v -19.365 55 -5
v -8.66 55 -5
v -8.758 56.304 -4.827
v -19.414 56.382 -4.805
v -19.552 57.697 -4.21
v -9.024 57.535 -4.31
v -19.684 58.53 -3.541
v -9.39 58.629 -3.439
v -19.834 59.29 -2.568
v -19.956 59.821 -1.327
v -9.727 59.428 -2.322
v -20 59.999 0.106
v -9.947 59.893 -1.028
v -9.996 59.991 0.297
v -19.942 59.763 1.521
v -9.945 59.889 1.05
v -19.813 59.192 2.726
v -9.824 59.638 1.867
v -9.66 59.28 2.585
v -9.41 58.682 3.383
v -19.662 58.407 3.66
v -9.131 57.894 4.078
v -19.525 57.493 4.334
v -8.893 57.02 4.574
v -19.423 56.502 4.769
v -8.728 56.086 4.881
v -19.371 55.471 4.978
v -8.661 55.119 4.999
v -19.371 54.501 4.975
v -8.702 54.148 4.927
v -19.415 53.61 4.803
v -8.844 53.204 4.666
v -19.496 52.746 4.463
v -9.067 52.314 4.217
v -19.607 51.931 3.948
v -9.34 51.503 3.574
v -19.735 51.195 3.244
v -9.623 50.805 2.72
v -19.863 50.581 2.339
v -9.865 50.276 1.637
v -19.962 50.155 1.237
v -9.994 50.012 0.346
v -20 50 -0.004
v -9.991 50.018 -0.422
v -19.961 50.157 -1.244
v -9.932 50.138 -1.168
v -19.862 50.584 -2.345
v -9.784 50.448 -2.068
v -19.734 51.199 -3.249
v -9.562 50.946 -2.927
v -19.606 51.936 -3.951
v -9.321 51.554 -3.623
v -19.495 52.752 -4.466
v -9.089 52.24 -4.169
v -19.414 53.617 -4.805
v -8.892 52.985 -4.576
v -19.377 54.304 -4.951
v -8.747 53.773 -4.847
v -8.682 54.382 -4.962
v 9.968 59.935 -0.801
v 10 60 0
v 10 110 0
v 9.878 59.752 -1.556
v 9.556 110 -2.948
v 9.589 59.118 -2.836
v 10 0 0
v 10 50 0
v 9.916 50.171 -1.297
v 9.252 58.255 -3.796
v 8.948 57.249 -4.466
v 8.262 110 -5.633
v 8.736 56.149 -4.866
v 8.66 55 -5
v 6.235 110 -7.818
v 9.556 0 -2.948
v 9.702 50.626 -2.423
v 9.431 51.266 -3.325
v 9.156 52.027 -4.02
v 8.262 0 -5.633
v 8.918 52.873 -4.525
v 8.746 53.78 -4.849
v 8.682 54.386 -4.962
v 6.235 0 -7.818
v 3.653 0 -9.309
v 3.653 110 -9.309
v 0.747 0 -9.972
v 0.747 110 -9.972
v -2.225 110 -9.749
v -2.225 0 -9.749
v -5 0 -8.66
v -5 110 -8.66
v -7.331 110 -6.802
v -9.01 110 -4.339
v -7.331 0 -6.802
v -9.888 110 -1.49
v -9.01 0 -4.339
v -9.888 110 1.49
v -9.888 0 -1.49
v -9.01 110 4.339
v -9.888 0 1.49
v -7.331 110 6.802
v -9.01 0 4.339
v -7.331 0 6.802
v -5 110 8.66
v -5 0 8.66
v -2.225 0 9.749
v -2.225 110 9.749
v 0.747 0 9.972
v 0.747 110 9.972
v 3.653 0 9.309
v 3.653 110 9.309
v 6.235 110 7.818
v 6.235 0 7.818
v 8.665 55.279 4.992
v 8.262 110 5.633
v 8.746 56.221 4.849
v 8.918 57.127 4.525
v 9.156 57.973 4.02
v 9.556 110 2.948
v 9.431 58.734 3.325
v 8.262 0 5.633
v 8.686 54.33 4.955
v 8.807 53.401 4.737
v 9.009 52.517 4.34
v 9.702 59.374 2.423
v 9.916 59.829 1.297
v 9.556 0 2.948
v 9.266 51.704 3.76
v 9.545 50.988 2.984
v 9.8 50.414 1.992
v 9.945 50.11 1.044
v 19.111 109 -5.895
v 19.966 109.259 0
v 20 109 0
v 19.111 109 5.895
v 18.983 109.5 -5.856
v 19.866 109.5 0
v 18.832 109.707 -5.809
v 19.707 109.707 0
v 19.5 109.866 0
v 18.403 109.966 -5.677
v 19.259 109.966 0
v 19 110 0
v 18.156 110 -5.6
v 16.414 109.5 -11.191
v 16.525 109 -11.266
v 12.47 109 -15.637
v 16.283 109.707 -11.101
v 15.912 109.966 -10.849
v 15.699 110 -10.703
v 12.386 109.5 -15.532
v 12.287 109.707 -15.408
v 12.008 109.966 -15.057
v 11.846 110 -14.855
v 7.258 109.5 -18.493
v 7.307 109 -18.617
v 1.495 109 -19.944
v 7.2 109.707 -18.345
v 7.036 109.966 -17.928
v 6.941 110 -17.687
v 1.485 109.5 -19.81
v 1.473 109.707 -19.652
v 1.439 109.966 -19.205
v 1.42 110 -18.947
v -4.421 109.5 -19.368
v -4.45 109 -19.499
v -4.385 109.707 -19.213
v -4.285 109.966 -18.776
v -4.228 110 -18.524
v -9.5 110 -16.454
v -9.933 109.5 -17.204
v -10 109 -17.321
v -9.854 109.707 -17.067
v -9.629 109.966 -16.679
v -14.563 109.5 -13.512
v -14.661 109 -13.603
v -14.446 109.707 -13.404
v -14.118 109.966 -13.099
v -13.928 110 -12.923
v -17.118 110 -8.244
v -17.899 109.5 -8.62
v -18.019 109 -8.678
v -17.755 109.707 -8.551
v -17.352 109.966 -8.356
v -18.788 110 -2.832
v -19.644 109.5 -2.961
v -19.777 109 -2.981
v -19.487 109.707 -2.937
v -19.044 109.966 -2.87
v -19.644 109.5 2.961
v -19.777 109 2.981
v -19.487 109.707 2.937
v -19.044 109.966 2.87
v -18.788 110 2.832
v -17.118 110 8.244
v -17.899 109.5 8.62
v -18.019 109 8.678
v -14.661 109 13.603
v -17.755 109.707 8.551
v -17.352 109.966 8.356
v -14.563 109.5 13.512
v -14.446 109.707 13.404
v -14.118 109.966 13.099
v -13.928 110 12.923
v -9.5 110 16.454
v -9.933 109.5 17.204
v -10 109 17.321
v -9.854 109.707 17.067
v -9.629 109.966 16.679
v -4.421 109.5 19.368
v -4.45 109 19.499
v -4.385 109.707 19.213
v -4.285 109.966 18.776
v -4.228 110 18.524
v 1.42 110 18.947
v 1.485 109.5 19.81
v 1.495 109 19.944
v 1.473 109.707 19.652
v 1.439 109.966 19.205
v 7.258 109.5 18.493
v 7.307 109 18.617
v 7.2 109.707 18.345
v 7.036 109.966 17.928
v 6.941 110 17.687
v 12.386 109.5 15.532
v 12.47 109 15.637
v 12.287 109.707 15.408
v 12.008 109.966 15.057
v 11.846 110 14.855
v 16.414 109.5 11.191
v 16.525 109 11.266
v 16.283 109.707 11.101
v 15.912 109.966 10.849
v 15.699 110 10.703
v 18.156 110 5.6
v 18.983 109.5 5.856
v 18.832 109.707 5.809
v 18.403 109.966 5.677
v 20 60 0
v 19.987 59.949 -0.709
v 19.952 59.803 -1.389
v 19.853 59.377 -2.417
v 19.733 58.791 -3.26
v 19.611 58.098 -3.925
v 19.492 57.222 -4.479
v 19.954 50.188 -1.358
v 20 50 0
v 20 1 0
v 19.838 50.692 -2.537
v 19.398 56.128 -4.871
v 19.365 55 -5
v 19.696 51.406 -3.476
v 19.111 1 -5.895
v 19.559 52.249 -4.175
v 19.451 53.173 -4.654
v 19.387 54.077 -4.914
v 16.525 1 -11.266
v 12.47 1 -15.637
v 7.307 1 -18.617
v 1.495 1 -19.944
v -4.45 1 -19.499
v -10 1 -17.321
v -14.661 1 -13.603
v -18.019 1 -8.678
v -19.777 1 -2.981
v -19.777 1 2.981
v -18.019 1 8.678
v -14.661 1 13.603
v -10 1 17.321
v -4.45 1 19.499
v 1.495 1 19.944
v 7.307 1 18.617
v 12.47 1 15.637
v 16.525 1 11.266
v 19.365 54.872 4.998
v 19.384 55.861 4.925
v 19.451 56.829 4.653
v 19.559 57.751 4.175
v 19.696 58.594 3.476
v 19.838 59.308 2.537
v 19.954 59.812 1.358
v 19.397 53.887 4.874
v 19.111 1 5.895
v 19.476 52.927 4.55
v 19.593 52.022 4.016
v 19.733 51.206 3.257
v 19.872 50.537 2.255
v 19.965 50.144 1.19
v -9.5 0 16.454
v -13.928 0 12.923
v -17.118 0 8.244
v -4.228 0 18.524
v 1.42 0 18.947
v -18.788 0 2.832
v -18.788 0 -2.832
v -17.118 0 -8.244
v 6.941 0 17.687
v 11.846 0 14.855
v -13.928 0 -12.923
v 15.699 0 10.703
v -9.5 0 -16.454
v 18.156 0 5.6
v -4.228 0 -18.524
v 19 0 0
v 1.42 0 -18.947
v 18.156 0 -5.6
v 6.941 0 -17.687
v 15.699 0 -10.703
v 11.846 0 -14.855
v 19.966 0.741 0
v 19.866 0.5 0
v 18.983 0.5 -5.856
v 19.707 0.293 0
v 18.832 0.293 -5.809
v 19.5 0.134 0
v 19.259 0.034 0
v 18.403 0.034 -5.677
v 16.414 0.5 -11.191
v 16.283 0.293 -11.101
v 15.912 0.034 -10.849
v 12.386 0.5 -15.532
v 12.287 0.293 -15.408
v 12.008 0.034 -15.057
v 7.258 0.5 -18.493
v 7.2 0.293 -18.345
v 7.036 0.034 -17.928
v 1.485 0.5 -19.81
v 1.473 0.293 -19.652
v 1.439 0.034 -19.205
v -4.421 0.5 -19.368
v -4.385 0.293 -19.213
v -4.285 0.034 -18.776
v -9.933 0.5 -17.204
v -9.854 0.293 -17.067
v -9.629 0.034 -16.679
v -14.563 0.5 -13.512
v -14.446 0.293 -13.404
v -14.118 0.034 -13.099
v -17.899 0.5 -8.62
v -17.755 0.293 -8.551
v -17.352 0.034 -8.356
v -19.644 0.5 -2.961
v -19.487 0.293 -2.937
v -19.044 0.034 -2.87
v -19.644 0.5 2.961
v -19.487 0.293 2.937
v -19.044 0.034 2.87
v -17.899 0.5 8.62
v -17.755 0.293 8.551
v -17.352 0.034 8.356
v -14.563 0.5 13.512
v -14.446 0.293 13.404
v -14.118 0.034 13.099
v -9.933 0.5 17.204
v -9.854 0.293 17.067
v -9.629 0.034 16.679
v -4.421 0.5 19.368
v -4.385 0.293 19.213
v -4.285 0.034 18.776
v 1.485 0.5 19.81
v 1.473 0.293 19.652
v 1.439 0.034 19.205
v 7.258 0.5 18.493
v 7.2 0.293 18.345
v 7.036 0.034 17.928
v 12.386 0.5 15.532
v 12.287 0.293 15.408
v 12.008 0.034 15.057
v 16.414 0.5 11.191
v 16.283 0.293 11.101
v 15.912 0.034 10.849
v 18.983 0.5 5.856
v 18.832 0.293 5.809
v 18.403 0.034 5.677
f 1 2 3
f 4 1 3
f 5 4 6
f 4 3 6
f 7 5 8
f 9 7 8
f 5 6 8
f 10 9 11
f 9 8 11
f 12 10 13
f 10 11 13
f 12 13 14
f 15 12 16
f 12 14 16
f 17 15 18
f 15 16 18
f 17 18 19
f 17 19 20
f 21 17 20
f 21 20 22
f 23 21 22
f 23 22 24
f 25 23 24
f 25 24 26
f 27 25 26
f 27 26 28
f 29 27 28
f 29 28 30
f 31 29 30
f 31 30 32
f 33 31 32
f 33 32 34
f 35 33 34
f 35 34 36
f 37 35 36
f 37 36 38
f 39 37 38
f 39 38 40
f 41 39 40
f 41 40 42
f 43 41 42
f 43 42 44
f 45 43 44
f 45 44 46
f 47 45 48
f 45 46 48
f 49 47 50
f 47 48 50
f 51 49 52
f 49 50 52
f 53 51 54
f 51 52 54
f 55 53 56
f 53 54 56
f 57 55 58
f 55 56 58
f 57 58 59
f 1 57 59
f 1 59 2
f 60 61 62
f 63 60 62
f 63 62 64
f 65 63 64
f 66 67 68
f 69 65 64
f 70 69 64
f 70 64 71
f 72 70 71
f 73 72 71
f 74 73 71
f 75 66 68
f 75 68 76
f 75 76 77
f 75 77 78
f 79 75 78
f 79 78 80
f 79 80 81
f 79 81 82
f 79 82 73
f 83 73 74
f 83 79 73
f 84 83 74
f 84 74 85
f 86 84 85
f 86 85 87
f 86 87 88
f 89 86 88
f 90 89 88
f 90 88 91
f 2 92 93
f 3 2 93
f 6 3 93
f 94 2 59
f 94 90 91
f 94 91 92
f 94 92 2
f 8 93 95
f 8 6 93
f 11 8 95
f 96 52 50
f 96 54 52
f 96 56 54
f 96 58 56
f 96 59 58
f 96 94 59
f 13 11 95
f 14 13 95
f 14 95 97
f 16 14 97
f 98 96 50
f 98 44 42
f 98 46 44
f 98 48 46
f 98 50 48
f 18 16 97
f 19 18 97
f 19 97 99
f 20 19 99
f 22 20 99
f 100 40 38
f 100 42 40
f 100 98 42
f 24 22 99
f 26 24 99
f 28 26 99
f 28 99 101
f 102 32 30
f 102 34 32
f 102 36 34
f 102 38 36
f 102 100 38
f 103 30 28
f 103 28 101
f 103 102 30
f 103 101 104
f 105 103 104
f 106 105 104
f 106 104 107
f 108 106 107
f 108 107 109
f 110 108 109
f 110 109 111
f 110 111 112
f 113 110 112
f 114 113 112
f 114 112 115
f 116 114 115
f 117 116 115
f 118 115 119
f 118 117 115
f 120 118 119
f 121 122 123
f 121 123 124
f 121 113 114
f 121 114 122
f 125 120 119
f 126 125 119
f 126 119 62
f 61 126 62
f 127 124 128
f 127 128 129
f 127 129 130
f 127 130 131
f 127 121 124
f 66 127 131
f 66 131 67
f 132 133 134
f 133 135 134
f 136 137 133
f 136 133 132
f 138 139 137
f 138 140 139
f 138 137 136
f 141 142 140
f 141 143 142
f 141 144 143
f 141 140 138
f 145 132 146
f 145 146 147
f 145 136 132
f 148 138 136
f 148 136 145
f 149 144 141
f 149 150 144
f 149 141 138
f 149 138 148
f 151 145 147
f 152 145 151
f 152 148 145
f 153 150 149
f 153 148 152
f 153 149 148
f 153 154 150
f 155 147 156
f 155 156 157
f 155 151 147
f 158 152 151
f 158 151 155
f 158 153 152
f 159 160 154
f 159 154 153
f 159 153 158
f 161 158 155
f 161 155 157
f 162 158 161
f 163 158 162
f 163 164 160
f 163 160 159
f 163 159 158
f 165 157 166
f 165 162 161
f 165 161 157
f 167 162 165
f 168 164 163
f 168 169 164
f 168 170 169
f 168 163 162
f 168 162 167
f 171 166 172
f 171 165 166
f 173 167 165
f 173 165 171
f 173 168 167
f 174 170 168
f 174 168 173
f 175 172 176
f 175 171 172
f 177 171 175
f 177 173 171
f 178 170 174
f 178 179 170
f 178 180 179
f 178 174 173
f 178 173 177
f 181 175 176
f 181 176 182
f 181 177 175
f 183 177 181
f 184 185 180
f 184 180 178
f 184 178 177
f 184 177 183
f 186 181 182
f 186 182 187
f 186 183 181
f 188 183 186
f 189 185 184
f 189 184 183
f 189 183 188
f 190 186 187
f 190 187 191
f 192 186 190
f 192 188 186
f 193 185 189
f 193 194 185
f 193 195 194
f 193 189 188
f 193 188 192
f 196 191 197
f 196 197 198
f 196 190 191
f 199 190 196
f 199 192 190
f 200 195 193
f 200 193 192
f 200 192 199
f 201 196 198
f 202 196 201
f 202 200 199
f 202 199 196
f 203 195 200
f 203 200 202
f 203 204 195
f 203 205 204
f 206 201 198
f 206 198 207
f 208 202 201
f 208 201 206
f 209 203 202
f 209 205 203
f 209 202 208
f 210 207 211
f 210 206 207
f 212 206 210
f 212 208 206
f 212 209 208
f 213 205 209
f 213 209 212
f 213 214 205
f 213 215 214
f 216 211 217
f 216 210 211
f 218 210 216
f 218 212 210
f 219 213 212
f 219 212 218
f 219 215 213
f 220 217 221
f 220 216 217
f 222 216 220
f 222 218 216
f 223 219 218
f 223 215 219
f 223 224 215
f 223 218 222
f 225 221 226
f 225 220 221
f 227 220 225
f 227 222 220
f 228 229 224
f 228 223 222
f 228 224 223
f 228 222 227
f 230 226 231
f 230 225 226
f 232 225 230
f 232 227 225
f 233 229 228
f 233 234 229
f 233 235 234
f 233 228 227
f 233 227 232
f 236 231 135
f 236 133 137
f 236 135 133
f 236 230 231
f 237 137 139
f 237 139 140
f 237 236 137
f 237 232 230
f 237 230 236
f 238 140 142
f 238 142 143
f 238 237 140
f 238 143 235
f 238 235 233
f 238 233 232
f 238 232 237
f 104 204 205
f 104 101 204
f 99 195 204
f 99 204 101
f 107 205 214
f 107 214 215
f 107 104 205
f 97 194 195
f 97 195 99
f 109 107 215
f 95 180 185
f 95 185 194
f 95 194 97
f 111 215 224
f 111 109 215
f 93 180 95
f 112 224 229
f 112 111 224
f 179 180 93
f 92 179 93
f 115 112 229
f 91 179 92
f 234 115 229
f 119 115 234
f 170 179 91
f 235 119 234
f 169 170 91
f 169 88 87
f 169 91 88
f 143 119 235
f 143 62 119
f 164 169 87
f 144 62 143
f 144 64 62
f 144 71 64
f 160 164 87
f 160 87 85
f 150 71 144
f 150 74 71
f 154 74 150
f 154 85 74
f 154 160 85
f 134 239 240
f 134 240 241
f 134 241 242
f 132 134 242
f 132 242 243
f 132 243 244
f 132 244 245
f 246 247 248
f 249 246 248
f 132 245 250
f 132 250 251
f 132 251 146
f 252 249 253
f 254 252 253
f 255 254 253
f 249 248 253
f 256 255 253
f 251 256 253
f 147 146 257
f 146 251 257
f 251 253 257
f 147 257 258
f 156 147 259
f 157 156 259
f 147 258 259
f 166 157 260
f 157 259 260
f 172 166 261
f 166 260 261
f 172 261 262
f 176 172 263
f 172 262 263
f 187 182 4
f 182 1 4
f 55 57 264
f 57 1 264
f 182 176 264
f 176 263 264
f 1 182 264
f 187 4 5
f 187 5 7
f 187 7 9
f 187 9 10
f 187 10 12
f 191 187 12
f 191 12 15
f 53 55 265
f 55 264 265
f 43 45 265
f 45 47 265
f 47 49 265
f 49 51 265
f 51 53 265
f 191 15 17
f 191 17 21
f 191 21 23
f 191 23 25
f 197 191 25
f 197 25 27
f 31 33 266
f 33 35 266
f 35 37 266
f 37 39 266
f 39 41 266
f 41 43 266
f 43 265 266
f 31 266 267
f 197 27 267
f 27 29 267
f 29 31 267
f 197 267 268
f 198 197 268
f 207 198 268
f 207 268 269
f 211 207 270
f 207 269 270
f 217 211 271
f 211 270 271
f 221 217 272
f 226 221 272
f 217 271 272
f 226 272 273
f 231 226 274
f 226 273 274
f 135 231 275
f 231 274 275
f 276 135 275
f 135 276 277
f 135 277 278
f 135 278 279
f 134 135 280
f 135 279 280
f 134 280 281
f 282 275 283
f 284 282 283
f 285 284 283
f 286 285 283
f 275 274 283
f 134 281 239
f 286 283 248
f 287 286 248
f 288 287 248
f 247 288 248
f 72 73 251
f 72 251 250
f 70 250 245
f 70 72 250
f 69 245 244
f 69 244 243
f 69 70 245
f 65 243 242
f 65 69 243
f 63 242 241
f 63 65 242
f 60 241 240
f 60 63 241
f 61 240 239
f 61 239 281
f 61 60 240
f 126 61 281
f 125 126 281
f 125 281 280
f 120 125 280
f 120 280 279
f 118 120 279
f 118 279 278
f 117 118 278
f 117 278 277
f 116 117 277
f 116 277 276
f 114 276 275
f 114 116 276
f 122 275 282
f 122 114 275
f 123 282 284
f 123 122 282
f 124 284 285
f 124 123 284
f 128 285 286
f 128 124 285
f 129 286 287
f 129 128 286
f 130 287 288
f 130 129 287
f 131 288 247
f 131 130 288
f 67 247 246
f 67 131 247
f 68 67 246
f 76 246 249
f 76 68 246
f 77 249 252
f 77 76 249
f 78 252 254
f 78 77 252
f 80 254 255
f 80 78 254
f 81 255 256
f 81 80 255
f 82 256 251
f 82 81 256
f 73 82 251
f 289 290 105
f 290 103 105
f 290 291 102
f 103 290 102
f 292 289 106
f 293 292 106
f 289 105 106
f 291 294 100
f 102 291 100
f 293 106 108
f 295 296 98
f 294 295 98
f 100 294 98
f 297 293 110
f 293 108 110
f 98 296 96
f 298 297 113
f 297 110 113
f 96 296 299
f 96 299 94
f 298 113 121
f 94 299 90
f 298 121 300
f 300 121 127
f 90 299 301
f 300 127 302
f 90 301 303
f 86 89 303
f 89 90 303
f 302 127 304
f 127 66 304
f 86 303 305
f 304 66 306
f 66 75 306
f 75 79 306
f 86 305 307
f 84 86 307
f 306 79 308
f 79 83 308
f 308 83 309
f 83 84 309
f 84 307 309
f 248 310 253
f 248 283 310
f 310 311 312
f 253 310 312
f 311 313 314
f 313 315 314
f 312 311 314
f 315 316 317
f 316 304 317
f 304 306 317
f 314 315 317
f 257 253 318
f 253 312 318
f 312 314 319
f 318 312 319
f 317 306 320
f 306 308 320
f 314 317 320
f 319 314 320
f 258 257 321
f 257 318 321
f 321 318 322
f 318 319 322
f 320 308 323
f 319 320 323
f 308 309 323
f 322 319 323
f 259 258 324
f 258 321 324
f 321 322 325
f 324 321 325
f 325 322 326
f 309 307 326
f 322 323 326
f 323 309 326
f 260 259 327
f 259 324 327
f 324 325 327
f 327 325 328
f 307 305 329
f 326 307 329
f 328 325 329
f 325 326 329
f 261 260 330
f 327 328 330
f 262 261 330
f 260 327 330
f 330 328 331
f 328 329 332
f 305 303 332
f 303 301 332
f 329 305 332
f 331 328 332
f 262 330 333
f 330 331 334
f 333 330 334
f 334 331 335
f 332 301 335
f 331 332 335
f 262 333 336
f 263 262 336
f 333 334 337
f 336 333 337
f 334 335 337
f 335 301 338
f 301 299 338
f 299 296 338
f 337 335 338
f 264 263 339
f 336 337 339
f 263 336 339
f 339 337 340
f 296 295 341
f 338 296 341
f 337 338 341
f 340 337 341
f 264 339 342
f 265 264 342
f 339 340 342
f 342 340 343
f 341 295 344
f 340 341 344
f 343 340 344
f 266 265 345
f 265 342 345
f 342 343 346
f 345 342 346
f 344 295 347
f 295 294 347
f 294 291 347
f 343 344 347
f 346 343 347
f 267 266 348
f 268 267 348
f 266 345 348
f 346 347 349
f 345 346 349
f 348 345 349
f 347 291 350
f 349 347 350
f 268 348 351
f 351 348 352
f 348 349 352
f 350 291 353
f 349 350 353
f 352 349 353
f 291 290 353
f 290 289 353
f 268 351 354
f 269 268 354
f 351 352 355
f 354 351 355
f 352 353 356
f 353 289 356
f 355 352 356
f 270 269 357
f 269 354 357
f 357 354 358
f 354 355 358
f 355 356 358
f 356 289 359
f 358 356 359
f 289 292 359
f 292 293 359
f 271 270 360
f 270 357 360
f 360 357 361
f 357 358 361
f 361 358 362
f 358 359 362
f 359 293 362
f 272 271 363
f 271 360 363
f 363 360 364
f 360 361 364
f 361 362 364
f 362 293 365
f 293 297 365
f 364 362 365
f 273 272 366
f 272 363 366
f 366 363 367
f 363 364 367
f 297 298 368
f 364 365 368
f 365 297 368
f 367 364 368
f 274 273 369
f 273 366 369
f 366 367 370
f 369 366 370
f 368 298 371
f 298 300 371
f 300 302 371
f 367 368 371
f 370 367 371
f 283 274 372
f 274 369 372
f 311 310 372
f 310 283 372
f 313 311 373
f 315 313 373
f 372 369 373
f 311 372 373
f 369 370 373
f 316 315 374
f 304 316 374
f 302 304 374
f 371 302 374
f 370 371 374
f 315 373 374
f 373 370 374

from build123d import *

# Parameters (mm, degrees)
SKETCH_1_R               = 20
SKETCH_1_R_2             = 10
EXTRUDE_1_DEPTH          = 110
SKETCH_2_R               = 5
CUT_EXTRUDE_1_DEPTH      = 21
CUT_EXTRUDE_1_DEPTH_BACK = 21
FILLET_1_R               = 1


with BuildPart() as part:
    # 草图1 → 凸台-拉伸1 (new body)
    with BuildSketch(Plane(origin=(0, 0, 0), x_dir=(1, 0, 0), z_dir=(0, 1, 0))):
        Circle(SKETCH_1_R)
        Circle(SKETCH_1_R_2, mode=Mode.SUBTRACT)
    extrude(amount=EXTRUDE_1_DEPTH)

    # 草图2 → 切除-拉伸1 (cut, two sides)
    with BuildSketch(Plane(origin=(0, 0, 0), x_dir=(0, 0, -1), z_dir=(1, 0, 0))) as cut_extrude_1_sk:
        with Locations((0, 55)):
            Circle(SKETCH_2_R)
    extrude(amount=CUT_EXTRUDE_1_DEPTH, mode=Mode.SUBTRACT)
    extrude(cut_extrude_1_sk.sketch, amount=-CUT_EXTRUDE_1_DEPTH_BACK, mode=Mode.SUBTRACT)

    # 圆角1
    fillet_1_edges = [part.edges().sort_by_distance(p)[0] for p in [
        (-20, 0, 0),
        (-20, 110, 0),
    ]]
    fillet(fillet_1_edges, radius=FILLET_1_R)


solid = part.part
